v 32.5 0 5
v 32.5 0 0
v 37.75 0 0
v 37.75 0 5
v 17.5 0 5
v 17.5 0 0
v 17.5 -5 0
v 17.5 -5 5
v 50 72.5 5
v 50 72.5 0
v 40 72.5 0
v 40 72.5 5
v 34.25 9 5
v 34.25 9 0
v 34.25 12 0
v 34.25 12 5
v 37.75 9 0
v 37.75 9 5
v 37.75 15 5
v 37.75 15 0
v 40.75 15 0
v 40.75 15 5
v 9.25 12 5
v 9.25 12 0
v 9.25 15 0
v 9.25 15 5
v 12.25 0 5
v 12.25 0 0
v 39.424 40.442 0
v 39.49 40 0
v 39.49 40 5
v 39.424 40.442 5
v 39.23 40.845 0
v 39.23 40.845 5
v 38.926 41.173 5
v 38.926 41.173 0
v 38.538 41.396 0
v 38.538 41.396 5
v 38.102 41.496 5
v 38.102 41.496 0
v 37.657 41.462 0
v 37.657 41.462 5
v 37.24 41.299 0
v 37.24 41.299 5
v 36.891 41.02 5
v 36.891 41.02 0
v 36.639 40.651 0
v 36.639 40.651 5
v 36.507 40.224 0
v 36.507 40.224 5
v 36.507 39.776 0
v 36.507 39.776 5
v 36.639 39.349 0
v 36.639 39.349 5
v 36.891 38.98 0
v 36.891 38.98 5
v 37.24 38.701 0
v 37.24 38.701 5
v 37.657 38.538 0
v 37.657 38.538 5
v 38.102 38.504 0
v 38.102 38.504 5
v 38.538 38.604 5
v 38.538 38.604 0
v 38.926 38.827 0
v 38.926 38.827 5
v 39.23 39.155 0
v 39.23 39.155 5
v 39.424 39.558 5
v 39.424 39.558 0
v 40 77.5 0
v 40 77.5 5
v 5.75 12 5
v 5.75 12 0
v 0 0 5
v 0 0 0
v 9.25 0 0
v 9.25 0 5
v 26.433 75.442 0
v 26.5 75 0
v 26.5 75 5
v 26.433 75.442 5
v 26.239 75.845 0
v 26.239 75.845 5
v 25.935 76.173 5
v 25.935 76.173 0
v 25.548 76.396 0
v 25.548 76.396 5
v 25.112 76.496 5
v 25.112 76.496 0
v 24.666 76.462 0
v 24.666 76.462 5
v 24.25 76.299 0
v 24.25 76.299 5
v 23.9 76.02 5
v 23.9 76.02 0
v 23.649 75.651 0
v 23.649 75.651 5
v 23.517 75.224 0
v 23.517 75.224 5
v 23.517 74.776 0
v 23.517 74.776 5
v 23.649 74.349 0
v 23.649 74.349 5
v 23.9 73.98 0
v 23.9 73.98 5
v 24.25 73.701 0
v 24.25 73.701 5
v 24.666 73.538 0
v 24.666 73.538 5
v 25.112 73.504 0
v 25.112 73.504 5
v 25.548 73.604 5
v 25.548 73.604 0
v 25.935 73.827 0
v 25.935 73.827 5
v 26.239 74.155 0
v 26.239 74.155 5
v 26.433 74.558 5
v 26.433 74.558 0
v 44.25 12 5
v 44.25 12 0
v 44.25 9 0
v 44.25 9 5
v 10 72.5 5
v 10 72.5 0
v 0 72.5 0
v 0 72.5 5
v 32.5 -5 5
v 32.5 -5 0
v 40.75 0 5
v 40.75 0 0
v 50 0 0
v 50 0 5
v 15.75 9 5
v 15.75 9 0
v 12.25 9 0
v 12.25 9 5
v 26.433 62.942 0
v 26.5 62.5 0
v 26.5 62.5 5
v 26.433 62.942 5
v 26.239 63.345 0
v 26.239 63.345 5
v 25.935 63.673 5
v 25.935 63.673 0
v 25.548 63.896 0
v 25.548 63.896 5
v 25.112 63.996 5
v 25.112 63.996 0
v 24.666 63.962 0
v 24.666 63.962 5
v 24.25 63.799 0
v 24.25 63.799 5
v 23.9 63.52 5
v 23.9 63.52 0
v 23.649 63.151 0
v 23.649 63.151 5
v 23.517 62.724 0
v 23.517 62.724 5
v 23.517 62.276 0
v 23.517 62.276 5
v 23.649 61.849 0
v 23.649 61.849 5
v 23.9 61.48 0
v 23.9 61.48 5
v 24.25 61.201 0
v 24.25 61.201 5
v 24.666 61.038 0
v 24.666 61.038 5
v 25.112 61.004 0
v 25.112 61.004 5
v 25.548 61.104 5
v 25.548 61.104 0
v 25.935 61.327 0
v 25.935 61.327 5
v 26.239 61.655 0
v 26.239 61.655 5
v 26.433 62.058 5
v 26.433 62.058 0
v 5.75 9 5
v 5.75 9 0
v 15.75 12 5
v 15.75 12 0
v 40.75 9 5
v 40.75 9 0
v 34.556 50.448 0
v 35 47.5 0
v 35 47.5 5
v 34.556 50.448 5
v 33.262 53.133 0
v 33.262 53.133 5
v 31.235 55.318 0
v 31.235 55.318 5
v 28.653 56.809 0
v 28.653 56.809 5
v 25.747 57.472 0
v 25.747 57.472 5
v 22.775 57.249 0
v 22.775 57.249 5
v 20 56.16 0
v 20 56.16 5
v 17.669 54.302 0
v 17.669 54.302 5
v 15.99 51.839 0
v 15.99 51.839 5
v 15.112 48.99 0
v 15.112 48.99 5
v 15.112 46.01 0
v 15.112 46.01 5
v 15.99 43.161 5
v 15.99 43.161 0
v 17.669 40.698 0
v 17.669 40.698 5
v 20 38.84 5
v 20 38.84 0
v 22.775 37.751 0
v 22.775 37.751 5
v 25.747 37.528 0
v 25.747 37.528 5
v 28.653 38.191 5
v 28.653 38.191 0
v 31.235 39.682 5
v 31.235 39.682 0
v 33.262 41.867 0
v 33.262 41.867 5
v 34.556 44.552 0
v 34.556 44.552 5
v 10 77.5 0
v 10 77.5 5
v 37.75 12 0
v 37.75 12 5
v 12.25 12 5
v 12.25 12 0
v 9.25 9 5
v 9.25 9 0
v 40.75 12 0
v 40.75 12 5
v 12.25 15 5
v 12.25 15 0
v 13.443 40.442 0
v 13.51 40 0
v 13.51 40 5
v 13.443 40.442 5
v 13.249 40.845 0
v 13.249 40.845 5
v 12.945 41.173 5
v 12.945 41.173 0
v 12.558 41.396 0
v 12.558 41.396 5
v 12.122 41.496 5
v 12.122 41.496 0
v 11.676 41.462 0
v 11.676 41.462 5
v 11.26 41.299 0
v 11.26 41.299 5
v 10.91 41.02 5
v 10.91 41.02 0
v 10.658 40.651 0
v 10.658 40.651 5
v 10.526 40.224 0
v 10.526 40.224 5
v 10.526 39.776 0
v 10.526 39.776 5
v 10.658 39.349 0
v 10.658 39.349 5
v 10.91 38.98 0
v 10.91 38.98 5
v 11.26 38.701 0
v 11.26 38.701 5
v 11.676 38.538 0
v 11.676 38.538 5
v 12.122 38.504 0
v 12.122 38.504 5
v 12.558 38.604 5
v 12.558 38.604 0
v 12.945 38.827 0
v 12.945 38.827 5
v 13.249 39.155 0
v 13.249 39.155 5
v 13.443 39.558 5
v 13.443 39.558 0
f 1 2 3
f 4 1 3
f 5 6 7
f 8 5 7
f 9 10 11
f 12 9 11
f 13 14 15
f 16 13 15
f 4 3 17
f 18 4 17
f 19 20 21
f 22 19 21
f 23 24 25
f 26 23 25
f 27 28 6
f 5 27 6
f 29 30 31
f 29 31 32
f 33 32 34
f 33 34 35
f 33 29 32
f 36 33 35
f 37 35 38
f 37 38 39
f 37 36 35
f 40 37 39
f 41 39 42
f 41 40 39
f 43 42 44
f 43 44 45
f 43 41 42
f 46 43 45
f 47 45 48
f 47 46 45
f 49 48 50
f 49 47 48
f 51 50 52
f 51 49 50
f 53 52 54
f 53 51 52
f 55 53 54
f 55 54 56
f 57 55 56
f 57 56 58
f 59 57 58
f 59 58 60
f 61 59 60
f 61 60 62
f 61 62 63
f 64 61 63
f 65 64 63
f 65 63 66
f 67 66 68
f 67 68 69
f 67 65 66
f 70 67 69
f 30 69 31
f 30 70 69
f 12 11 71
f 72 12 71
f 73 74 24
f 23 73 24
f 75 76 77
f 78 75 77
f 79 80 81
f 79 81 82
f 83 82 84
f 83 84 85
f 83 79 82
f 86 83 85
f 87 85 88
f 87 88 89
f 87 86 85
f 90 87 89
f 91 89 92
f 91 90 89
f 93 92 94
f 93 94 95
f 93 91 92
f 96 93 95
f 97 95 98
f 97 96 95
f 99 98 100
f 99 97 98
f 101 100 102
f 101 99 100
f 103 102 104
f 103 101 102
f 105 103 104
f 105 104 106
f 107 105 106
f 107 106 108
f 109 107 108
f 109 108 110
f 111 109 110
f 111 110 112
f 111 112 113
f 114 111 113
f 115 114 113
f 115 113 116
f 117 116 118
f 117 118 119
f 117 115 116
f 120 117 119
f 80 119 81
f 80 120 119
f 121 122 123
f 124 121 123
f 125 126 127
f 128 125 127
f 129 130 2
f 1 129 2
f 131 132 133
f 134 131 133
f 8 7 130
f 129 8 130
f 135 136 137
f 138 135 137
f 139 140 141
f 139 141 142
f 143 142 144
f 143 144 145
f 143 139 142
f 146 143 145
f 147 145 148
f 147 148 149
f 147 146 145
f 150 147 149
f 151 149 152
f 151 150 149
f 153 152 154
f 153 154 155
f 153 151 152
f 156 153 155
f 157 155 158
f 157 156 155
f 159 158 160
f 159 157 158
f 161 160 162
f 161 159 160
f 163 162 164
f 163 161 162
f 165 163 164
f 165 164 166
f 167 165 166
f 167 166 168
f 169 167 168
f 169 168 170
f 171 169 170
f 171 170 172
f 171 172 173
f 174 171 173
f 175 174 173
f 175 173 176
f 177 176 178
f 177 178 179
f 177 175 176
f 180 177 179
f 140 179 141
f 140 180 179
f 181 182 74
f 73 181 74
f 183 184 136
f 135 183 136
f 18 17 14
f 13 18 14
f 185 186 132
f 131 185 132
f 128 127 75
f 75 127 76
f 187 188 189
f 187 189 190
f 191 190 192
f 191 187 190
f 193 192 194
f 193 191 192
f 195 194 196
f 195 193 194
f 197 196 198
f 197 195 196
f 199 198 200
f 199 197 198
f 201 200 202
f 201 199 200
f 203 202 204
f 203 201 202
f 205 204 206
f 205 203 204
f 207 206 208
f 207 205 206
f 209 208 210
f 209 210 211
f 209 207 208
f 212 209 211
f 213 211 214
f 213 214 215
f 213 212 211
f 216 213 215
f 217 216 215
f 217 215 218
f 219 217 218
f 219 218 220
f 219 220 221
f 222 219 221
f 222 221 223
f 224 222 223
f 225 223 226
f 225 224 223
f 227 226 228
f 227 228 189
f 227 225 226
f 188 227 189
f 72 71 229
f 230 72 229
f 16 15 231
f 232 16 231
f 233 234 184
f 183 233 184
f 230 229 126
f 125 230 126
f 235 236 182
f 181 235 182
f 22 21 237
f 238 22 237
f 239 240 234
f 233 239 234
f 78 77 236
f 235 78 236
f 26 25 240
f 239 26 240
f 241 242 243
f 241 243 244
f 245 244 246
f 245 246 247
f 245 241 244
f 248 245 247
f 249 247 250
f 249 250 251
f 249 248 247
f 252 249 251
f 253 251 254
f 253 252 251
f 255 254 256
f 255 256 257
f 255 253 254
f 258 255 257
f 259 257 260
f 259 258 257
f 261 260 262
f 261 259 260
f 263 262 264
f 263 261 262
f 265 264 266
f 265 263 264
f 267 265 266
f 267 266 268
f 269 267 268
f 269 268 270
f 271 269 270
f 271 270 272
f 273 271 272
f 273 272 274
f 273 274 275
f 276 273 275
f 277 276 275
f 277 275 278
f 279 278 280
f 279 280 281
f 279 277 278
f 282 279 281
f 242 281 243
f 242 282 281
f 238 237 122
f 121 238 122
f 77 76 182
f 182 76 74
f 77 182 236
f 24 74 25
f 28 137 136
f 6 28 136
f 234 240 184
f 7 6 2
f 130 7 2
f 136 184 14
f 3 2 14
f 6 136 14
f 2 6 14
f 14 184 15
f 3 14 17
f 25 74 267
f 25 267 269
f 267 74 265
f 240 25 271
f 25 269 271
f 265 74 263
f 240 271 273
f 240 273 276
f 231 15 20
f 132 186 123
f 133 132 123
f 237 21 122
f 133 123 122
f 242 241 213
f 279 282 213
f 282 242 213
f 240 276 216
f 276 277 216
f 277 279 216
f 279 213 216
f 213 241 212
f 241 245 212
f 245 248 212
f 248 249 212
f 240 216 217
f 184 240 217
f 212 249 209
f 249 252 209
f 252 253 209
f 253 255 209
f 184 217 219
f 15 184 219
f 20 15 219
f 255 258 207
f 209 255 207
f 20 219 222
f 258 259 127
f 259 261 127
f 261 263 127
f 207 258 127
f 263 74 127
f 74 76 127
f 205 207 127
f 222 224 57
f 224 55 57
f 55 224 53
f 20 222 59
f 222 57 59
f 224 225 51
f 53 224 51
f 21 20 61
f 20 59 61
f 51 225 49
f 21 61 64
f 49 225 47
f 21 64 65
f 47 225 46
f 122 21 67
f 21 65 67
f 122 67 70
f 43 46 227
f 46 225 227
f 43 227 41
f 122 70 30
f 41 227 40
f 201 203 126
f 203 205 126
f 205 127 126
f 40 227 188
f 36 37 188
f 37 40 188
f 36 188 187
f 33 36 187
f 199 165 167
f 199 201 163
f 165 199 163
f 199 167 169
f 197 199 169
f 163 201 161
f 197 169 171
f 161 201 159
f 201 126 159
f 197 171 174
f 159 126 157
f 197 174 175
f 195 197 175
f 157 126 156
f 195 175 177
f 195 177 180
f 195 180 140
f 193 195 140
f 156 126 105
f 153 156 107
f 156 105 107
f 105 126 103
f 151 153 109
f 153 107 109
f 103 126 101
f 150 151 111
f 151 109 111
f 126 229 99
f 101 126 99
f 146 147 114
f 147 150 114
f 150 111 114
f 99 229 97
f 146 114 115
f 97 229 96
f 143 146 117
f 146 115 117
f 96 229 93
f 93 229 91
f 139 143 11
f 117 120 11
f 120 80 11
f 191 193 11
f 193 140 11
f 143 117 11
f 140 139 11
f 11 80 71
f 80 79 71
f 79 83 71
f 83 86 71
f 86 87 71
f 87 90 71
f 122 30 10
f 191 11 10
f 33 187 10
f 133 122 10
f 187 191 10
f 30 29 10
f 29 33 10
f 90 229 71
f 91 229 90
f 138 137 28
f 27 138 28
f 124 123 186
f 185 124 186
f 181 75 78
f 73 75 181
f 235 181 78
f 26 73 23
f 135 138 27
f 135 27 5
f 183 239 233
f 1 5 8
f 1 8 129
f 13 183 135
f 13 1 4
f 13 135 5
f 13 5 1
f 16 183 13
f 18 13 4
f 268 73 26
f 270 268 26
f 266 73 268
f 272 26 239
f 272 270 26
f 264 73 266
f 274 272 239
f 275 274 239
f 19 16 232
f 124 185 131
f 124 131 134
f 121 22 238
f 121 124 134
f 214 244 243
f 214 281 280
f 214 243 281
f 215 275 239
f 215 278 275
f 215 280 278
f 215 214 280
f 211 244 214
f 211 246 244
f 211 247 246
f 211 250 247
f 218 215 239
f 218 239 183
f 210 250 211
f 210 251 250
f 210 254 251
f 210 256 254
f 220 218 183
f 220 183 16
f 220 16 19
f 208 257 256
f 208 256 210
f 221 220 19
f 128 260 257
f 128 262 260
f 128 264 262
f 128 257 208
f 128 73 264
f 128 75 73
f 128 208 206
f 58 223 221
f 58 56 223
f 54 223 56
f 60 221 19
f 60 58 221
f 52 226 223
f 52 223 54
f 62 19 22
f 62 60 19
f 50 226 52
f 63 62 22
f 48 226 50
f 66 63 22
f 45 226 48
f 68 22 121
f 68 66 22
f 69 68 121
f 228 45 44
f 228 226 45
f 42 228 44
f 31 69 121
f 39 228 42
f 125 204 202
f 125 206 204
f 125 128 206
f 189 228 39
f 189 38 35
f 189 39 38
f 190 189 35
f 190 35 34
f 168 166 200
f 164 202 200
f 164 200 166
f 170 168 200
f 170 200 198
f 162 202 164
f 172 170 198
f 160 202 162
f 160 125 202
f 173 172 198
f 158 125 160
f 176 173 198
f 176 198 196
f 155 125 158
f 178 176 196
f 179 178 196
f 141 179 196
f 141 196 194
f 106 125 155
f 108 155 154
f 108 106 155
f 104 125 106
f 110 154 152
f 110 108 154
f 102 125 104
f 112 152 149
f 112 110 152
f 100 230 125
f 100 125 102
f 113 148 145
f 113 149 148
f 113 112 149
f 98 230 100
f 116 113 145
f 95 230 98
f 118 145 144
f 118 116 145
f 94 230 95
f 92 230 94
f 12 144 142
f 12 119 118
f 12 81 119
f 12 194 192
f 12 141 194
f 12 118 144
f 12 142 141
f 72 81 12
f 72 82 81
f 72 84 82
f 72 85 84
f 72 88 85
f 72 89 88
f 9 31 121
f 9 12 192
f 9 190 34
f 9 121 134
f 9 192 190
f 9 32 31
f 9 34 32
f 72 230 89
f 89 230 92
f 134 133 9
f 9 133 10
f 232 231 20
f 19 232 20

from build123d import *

# Parameters (mm, degrees)
CROQUIS1_R              = 1.5
CROQUIS1_R_2            = 10
SALIENTE_EXTRUIR1_DEPTH = 5


with BuildPart() as part:
    # Croquis1 → Saliente-Extruir1 (new body)
    with BuildSketch(Plane.XY):
        Polygon((0, 0), (9.25, 0), (9.25, 9), (5.75, 9), (5.75, 12), (9.25, 12), (9.25, 15), (12.25, 15), (12.25, 12), (15.75, 12), (15.75, 9), (12.25, 9), (12.25, 0), (17.5, 0), (17.5, -5), (32.5, -5), (32.5, 0), (37.75, 0), (37.75, 9), (34.25, 9), (34.25, 12), (37.75, 12), (37.75, 15), (40.75, 15), (40.75, 12), (44.25, 12), (44.25, 9), (40.75, 9), (40.75, 0), (50, 0), (50, 72.5), (40, 72.5), (40, 77.5), (10, 77.5), (10, 72.5), (0, 72.5), align=None)
        with Locations((25, 75)):
            Circle(CROQUIS1_R, mode=Mode.SUBTRACT)
        with Locations((25, 47.5)):
            Circle(CROQUIS1_R_2, mode=Mode.SUBTRACT)
        with Locations((25, 62.5)):
            Circle(CROQUIS1_R, mode=Mode.SUBTRACT)
        with Locations((37.990381057, 40)):
            Circle(CROQUIS1_R, mode=Mode.SUBTRACT)
        with Locations((12.009618943, 40)):
            Circle(CROQUIS1_R, mode=Mode.SUBTRACT)
    extrude(amount=SALIENTE_EXTRUIR1_DEPTH)


solid = part.part
